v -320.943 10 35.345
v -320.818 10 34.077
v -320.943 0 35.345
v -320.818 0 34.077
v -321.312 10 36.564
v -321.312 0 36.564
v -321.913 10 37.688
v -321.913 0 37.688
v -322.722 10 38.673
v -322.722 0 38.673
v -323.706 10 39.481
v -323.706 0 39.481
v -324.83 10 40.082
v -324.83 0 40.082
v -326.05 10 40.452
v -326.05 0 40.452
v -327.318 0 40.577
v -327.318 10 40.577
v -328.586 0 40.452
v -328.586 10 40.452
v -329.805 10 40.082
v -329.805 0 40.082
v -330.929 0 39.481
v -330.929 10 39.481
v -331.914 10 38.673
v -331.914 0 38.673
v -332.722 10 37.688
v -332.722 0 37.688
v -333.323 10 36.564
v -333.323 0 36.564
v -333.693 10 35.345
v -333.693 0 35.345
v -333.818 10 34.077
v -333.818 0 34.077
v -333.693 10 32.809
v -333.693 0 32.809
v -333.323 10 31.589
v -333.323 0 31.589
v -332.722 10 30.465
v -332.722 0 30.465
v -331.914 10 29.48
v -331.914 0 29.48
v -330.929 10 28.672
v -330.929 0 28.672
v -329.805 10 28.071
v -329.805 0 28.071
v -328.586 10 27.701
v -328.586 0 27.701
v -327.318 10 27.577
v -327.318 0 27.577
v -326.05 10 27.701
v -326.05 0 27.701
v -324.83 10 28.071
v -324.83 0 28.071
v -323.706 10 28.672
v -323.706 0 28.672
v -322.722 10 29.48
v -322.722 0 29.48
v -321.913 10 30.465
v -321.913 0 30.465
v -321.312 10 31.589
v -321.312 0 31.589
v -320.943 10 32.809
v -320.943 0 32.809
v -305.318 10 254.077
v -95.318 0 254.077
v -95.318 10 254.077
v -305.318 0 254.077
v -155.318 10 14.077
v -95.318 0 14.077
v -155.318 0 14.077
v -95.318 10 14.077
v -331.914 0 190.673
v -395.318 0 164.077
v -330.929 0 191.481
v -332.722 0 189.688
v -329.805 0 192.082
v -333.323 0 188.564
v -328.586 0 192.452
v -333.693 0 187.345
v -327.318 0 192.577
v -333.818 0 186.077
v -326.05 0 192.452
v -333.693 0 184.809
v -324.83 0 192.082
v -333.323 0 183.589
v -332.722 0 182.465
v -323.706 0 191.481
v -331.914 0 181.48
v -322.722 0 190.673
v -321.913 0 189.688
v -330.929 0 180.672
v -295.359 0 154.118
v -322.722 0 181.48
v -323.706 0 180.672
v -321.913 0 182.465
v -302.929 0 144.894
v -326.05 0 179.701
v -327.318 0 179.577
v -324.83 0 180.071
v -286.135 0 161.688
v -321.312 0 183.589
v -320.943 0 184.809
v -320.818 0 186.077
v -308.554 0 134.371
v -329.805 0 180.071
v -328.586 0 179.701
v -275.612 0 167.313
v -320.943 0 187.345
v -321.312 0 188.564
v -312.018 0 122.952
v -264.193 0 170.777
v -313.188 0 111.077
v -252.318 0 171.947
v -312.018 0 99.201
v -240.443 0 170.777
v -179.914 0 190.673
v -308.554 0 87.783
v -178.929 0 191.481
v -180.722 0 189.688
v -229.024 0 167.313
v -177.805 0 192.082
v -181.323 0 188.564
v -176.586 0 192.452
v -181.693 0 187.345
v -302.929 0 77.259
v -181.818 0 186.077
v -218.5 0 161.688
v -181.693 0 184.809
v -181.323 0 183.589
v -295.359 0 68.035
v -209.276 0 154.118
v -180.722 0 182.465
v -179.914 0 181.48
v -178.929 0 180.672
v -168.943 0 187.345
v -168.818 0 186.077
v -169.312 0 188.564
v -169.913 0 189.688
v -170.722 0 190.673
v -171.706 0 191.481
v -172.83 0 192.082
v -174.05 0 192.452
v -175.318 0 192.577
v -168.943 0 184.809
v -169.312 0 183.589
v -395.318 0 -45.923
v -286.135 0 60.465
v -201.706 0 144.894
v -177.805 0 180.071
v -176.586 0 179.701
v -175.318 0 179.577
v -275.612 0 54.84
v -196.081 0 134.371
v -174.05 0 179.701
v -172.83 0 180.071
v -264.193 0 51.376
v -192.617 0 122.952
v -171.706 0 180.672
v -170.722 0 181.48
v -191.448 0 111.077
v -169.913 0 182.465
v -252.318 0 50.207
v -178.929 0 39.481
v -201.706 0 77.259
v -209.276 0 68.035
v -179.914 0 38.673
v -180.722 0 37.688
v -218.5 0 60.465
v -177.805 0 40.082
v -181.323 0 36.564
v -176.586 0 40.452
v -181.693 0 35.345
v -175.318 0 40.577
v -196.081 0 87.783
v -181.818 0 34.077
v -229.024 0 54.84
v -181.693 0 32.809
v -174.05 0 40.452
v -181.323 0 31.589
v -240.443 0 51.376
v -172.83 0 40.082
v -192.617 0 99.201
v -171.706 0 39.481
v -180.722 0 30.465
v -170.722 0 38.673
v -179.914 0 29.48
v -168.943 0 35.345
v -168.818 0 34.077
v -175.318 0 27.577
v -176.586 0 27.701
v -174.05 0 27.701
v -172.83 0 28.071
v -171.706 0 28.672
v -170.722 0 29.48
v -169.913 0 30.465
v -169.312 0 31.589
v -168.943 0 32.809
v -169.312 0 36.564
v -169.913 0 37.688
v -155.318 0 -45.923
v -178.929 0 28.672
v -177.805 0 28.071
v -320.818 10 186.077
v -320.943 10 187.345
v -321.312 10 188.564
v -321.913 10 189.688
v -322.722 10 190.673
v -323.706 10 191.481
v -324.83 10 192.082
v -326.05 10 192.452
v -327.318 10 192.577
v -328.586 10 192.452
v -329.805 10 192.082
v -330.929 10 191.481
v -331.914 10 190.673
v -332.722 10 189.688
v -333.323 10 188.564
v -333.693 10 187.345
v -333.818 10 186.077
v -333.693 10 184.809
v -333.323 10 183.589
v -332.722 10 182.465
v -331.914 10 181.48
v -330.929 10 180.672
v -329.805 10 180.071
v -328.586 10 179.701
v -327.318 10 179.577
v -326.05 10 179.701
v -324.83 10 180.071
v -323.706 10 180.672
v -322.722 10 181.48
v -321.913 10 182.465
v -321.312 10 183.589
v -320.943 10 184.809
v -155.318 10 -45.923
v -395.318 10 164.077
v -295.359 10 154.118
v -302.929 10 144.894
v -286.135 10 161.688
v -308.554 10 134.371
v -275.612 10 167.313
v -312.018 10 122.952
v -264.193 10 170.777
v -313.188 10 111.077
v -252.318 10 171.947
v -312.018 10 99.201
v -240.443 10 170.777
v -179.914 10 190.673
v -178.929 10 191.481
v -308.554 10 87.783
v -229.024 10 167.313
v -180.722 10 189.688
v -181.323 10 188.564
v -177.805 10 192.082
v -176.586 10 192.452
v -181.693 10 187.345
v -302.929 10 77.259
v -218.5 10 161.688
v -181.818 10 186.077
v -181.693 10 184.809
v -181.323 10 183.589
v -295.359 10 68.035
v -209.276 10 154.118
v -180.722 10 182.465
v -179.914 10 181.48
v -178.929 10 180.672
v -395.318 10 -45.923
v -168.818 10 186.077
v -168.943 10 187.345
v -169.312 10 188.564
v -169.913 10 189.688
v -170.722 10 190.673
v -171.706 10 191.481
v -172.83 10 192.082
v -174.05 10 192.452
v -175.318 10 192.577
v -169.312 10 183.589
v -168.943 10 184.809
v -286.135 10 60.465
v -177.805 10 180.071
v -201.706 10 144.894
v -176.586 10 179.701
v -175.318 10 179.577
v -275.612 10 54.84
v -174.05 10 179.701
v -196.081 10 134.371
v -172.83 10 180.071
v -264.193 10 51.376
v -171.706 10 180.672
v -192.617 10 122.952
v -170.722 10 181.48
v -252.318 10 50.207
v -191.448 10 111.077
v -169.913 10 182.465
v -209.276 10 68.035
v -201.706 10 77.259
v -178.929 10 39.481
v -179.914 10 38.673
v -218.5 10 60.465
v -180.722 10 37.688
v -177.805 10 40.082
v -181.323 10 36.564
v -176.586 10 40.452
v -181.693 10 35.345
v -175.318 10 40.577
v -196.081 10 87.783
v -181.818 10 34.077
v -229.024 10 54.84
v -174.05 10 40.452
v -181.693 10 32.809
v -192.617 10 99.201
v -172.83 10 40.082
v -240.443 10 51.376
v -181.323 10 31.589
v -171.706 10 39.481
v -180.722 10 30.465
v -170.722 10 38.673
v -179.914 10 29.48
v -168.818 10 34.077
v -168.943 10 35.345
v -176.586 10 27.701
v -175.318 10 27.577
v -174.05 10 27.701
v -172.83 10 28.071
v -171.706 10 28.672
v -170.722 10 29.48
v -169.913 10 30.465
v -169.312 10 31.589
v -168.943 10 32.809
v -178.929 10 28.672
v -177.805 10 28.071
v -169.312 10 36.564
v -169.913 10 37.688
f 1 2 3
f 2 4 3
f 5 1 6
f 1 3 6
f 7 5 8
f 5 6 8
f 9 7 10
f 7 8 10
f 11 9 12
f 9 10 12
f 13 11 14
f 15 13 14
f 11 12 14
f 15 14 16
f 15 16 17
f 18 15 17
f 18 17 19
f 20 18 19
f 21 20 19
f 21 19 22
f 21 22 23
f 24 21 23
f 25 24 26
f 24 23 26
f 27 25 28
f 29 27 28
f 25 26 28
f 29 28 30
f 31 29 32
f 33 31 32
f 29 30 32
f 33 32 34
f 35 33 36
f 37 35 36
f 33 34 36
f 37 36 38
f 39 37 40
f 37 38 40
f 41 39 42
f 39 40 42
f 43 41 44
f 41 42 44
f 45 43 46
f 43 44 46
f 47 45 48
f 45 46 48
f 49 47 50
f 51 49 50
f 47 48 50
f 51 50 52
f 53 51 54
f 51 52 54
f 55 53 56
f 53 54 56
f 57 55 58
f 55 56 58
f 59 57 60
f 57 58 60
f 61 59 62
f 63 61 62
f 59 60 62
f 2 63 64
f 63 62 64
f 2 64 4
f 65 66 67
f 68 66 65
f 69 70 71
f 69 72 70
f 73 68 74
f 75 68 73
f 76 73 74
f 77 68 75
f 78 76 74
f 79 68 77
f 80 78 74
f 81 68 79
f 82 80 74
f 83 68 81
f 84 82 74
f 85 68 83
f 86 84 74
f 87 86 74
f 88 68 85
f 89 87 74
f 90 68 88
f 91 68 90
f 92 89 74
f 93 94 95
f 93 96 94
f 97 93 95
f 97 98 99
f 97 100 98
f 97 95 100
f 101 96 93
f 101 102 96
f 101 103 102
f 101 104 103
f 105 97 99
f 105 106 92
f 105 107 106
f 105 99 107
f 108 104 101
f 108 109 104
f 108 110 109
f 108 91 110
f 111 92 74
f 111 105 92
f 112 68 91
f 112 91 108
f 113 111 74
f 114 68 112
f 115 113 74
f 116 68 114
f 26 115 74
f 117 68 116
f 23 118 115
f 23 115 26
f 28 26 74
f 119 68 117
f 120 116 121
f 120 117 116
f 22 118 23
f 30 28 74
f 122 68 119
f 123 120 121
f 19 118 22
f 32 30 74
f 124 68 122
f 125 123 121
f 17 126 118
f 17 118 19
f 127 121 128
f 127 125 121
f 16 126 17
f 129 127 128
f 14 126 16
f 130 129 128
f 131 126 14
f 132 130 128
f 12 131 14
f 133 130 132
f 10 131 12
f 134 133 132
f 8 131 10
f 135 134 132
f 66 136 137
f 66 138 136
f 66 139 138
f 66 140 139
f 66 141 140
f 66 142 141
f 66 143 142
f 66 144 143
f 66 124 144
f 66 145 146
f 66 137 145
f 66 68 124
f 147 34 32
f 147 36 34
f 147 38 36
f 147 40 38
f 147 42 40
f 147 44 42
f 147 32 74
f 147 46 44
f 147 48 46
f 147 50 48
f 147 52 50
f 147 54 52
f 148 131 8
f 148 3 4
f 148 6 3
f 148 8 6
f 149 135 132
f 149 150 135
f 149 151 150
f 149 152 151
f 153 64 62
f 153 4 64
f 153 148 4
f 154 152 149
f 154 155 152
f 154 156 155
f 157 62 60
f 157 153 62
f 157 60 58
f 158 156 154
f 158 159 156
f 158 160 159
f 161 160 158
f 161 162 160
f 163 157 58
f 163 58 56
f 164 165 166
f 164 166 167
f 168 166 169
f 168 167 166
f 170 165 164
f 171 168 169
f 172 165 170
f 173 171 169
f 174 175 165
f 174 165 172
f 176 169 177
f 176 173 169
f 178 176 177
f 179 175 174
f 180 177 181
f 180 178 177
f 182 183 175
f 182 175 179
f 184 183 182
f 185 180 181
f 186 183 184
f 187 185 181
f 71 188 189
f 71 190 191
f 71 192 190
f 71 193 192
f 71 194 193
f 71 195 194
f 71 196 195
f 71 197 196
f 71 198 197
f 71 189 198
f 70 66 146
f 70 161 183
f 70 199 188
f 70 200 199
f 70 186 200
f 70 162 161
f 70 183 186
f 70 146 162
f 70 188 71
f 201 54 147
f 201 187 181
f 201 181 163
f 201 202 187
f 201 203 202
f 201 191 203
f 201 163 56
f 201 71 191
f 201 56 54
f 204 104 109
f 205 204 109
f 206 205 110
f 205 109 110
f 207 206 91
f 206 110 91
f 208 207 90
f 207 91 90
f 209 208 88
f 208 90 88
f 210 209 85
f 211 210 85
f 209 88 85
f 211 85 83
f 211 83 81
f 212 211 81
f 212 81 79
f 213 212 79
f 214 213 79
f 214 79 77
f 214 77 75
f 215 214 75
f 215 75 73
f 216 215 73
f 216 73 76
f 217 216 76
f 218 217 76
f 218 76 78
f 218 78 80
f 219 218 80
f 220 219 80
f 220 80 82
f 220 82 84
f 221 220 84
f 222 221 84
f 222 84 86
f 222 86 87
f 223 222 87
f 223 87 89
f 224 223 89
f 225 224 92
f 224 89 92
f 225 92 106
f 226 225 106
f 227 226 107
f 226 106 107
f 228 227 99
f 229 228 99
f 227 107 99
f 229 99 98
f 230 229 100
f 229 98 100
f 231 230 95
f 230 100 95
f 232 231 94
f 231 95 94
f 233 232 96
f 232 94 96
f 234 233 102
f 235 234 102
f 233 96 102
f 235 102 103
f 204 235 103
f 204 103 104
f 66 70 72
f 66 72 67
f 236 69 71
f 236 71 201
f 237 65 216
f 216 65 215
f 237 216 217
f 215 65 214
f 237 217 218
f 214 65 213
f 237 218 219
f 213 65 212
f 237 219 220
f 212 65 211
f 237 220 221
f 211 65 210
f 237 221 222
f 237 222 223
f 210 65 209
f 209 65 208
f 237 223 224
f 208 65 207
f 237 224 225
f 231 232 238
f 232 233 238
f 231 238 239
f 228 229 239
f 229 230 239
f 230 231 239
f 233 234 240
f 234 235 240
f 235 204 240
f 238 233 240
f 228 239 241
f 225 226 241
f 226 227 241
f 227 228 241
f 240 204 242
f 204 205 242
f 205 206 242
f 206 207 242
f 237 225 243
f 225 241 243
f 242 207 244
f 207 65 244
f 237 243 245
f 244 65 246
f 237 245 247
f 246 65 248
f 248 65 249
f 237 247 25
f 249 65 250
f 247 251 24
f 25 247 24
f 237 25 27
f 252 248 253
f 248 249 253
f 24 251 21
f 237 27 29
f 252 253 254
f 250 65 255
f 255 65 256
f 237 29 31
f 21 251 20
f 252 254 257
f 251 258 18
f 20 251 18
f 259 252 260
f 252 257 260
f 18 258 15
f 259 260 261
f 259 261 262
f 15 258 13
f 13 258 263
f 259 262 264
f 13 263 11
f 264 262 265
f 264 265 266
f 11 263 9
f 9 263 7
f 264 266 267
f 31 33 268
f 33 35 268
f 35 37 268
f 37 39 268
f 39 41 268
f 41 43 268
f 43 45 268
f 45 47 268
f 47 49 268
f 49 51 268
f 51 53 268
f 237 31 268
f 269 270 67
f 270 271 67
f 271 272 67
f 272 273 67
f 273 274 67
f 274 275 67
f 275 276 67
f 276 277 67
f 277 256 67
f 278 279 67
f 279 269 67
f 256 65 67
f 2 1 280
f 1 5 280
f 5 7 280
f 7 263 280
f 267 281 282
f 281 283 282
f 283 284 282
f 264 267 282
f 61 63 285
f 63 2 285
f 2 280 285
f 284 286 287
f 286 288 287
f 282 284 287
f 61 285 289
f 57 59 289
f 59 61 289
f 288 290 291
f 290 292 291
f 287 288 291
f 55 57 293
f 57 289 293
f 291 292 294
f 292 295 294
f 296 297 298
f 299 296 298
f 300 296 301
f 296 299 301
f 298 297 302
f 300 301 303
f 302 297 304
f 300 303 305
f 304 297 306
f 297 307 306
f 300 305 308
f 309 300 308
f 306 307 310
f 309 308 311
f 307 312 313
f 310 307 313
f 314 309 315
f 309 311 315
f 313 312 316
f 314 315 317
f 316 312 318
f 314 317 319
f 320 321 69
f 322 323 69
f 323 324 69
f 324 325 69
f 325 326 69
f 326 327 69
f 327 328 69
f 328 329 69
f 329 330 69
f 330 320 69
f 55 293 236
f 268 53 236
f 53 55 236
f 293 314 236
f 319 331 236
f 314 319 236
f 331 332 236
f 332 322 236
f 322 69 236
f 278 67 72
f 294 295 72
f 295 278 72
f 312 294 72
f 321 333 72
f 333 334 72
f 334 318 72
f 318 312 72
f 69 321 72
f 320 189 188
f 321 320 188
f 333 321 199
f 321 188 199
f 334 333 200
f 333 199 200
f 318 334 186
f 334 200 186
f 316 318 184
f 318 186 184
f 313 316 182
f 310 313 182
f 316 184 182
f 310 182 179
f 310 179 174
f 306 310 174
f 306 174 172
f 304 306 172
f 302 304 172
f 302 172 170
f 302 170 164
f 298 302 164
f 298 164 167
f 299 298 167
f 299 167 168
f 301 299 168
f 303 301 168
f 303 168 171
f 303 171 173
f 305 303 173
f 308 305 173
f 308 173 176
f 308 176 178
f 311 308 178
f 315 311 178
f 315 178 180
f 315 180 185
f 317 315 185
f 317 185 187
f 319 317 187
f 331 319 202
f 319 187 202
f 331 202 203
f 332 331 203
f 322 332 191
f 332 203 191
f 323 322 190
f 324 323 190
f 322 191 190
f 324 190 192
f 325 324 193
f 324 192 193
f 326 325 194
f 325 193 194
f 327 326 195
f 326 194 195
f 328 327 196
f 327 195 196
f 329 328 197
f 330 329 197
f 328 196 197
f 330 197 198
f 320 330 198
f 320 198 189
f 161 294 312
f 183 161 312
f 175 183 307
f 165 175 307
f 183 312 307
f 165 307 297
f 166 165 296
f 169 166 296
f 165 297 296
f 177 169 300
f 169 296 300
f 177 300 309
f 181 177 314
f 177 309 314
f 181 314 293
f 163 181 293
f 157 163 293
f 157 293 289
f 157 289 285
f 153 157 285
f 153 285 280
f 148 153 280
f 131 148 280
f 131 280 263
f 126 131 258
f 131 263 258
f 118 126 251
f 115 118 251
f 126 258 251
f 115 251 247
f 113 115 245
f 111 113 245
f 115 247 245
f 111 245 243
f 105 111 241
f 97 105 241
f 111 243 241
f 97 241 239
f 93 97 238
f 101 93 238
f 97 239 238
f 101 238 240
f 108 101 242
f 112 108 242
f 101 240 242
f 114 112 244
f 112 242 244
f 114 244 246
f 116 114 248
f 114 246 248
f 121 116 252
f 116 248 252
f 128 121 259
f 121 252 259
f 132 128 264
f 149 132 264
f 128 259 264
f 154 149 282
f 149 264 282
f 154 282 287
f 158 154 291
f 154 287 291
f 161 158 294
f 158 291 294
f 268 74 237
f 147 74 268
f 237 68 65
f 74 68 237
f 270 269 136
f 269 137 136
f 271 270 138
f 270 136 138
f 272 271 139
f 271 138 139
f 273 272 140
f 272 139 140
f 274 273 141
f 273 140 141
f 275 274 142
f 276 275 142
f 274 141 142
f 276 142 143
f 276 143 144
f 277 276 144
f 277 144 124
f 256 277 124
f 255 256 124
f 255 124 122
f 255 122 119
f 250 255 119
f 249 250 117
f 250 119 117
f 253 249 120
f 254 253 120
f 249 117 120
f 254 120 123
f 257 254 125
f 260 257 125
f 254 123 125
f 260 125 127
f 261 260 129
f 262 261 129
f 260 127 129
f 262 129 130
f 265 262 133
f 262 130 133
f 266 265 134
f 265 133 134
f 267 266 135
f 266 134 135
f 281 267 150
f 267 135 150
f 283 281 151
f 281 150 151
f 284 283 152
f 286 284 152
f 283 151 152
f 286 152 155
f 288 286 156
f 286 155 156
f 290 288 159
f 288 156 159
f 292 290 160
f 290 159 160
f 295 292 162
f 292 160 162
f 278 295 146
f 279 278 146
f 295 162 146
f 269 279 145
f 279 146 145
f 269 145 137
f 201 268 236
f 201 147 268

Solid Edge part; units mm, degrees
sketch "Sketch1" plane through (0, 0, 0) normal (0, -1, 0) x (1, 0, 0)
  line L0 (-395.3177, -45.9234) -> (-95.3177, -45.9234)
  line L1 (-95.3177, -45.9234) -> (-95.3177, 254.0766)
  line L2 (-95.3177, 254.0766) -> (-395.3177, 254.0766)
  line L3 (-395.3177, 254.0766) -> (-395.3177, -45.9234)
  dimension "D1" = 300
  dimension "D2" = 300
extrude "Protrusion1" add sketch "Sketch1" against normal blind 10
sketch "Sketch2" plane through (-145.3177, 0, 4.0766) normal (0, -1, 0) x (1, 0, 0)
  circle A0 centre (-30, 182) radius 6.5
  circle A1 centre (-182, 30) radius 6.5
  circle A2 centre (-30, 30) radius 6.5
  circle A3 centre (-182, 182) radius 6.5
  dimension "D1" = 13
  dimension "D2" = 13
  dimension "D3" = 13
  dimension "D4" = 13
  dimension "D5" = 152
  dimension "D6" = 152
  dimension "D7" = 80
  dimension "D8" = 68
extrude "Cutout1" cut sketch "Sketch2" along normal through all and the other way through all
sketch "Sketch3" plane through (-245.3177, 10, 104.0766) normal (0, 1, 0) x (1, 0, 0)
  circle A0 centre (-7, -7) radius 60.87
  line L0 (150, 150) -> (150, 90)
  line L1 (150, 90) -> (90, 90)
  line L2 (90, 90) -> (90, 150)
  line L3 (90, 150) -> (150, 150)
  dimension "D1" = 60
  dimension "D2" = 60
  dimension "D3" = 143
  dimension "D4" = 143
extrude "Cutout2" cut sketch "Sketch3" against normal through all
sketch "Sketch4" plane through (-245.3177, 0, 104.0766) normal (0, -1, 0) x (0, 0, -1)
  line L0 (-150, -60) -> (-60, -150)
  line L1 (-60, -150) -> (-150, -150)
  line L2 (-150, -150) -> (-150, -60)
  dimension "D1" = 90
  dimension "D2" = 90
extrude "Cutout3" cut sketch "Sketch4" against normal through all
